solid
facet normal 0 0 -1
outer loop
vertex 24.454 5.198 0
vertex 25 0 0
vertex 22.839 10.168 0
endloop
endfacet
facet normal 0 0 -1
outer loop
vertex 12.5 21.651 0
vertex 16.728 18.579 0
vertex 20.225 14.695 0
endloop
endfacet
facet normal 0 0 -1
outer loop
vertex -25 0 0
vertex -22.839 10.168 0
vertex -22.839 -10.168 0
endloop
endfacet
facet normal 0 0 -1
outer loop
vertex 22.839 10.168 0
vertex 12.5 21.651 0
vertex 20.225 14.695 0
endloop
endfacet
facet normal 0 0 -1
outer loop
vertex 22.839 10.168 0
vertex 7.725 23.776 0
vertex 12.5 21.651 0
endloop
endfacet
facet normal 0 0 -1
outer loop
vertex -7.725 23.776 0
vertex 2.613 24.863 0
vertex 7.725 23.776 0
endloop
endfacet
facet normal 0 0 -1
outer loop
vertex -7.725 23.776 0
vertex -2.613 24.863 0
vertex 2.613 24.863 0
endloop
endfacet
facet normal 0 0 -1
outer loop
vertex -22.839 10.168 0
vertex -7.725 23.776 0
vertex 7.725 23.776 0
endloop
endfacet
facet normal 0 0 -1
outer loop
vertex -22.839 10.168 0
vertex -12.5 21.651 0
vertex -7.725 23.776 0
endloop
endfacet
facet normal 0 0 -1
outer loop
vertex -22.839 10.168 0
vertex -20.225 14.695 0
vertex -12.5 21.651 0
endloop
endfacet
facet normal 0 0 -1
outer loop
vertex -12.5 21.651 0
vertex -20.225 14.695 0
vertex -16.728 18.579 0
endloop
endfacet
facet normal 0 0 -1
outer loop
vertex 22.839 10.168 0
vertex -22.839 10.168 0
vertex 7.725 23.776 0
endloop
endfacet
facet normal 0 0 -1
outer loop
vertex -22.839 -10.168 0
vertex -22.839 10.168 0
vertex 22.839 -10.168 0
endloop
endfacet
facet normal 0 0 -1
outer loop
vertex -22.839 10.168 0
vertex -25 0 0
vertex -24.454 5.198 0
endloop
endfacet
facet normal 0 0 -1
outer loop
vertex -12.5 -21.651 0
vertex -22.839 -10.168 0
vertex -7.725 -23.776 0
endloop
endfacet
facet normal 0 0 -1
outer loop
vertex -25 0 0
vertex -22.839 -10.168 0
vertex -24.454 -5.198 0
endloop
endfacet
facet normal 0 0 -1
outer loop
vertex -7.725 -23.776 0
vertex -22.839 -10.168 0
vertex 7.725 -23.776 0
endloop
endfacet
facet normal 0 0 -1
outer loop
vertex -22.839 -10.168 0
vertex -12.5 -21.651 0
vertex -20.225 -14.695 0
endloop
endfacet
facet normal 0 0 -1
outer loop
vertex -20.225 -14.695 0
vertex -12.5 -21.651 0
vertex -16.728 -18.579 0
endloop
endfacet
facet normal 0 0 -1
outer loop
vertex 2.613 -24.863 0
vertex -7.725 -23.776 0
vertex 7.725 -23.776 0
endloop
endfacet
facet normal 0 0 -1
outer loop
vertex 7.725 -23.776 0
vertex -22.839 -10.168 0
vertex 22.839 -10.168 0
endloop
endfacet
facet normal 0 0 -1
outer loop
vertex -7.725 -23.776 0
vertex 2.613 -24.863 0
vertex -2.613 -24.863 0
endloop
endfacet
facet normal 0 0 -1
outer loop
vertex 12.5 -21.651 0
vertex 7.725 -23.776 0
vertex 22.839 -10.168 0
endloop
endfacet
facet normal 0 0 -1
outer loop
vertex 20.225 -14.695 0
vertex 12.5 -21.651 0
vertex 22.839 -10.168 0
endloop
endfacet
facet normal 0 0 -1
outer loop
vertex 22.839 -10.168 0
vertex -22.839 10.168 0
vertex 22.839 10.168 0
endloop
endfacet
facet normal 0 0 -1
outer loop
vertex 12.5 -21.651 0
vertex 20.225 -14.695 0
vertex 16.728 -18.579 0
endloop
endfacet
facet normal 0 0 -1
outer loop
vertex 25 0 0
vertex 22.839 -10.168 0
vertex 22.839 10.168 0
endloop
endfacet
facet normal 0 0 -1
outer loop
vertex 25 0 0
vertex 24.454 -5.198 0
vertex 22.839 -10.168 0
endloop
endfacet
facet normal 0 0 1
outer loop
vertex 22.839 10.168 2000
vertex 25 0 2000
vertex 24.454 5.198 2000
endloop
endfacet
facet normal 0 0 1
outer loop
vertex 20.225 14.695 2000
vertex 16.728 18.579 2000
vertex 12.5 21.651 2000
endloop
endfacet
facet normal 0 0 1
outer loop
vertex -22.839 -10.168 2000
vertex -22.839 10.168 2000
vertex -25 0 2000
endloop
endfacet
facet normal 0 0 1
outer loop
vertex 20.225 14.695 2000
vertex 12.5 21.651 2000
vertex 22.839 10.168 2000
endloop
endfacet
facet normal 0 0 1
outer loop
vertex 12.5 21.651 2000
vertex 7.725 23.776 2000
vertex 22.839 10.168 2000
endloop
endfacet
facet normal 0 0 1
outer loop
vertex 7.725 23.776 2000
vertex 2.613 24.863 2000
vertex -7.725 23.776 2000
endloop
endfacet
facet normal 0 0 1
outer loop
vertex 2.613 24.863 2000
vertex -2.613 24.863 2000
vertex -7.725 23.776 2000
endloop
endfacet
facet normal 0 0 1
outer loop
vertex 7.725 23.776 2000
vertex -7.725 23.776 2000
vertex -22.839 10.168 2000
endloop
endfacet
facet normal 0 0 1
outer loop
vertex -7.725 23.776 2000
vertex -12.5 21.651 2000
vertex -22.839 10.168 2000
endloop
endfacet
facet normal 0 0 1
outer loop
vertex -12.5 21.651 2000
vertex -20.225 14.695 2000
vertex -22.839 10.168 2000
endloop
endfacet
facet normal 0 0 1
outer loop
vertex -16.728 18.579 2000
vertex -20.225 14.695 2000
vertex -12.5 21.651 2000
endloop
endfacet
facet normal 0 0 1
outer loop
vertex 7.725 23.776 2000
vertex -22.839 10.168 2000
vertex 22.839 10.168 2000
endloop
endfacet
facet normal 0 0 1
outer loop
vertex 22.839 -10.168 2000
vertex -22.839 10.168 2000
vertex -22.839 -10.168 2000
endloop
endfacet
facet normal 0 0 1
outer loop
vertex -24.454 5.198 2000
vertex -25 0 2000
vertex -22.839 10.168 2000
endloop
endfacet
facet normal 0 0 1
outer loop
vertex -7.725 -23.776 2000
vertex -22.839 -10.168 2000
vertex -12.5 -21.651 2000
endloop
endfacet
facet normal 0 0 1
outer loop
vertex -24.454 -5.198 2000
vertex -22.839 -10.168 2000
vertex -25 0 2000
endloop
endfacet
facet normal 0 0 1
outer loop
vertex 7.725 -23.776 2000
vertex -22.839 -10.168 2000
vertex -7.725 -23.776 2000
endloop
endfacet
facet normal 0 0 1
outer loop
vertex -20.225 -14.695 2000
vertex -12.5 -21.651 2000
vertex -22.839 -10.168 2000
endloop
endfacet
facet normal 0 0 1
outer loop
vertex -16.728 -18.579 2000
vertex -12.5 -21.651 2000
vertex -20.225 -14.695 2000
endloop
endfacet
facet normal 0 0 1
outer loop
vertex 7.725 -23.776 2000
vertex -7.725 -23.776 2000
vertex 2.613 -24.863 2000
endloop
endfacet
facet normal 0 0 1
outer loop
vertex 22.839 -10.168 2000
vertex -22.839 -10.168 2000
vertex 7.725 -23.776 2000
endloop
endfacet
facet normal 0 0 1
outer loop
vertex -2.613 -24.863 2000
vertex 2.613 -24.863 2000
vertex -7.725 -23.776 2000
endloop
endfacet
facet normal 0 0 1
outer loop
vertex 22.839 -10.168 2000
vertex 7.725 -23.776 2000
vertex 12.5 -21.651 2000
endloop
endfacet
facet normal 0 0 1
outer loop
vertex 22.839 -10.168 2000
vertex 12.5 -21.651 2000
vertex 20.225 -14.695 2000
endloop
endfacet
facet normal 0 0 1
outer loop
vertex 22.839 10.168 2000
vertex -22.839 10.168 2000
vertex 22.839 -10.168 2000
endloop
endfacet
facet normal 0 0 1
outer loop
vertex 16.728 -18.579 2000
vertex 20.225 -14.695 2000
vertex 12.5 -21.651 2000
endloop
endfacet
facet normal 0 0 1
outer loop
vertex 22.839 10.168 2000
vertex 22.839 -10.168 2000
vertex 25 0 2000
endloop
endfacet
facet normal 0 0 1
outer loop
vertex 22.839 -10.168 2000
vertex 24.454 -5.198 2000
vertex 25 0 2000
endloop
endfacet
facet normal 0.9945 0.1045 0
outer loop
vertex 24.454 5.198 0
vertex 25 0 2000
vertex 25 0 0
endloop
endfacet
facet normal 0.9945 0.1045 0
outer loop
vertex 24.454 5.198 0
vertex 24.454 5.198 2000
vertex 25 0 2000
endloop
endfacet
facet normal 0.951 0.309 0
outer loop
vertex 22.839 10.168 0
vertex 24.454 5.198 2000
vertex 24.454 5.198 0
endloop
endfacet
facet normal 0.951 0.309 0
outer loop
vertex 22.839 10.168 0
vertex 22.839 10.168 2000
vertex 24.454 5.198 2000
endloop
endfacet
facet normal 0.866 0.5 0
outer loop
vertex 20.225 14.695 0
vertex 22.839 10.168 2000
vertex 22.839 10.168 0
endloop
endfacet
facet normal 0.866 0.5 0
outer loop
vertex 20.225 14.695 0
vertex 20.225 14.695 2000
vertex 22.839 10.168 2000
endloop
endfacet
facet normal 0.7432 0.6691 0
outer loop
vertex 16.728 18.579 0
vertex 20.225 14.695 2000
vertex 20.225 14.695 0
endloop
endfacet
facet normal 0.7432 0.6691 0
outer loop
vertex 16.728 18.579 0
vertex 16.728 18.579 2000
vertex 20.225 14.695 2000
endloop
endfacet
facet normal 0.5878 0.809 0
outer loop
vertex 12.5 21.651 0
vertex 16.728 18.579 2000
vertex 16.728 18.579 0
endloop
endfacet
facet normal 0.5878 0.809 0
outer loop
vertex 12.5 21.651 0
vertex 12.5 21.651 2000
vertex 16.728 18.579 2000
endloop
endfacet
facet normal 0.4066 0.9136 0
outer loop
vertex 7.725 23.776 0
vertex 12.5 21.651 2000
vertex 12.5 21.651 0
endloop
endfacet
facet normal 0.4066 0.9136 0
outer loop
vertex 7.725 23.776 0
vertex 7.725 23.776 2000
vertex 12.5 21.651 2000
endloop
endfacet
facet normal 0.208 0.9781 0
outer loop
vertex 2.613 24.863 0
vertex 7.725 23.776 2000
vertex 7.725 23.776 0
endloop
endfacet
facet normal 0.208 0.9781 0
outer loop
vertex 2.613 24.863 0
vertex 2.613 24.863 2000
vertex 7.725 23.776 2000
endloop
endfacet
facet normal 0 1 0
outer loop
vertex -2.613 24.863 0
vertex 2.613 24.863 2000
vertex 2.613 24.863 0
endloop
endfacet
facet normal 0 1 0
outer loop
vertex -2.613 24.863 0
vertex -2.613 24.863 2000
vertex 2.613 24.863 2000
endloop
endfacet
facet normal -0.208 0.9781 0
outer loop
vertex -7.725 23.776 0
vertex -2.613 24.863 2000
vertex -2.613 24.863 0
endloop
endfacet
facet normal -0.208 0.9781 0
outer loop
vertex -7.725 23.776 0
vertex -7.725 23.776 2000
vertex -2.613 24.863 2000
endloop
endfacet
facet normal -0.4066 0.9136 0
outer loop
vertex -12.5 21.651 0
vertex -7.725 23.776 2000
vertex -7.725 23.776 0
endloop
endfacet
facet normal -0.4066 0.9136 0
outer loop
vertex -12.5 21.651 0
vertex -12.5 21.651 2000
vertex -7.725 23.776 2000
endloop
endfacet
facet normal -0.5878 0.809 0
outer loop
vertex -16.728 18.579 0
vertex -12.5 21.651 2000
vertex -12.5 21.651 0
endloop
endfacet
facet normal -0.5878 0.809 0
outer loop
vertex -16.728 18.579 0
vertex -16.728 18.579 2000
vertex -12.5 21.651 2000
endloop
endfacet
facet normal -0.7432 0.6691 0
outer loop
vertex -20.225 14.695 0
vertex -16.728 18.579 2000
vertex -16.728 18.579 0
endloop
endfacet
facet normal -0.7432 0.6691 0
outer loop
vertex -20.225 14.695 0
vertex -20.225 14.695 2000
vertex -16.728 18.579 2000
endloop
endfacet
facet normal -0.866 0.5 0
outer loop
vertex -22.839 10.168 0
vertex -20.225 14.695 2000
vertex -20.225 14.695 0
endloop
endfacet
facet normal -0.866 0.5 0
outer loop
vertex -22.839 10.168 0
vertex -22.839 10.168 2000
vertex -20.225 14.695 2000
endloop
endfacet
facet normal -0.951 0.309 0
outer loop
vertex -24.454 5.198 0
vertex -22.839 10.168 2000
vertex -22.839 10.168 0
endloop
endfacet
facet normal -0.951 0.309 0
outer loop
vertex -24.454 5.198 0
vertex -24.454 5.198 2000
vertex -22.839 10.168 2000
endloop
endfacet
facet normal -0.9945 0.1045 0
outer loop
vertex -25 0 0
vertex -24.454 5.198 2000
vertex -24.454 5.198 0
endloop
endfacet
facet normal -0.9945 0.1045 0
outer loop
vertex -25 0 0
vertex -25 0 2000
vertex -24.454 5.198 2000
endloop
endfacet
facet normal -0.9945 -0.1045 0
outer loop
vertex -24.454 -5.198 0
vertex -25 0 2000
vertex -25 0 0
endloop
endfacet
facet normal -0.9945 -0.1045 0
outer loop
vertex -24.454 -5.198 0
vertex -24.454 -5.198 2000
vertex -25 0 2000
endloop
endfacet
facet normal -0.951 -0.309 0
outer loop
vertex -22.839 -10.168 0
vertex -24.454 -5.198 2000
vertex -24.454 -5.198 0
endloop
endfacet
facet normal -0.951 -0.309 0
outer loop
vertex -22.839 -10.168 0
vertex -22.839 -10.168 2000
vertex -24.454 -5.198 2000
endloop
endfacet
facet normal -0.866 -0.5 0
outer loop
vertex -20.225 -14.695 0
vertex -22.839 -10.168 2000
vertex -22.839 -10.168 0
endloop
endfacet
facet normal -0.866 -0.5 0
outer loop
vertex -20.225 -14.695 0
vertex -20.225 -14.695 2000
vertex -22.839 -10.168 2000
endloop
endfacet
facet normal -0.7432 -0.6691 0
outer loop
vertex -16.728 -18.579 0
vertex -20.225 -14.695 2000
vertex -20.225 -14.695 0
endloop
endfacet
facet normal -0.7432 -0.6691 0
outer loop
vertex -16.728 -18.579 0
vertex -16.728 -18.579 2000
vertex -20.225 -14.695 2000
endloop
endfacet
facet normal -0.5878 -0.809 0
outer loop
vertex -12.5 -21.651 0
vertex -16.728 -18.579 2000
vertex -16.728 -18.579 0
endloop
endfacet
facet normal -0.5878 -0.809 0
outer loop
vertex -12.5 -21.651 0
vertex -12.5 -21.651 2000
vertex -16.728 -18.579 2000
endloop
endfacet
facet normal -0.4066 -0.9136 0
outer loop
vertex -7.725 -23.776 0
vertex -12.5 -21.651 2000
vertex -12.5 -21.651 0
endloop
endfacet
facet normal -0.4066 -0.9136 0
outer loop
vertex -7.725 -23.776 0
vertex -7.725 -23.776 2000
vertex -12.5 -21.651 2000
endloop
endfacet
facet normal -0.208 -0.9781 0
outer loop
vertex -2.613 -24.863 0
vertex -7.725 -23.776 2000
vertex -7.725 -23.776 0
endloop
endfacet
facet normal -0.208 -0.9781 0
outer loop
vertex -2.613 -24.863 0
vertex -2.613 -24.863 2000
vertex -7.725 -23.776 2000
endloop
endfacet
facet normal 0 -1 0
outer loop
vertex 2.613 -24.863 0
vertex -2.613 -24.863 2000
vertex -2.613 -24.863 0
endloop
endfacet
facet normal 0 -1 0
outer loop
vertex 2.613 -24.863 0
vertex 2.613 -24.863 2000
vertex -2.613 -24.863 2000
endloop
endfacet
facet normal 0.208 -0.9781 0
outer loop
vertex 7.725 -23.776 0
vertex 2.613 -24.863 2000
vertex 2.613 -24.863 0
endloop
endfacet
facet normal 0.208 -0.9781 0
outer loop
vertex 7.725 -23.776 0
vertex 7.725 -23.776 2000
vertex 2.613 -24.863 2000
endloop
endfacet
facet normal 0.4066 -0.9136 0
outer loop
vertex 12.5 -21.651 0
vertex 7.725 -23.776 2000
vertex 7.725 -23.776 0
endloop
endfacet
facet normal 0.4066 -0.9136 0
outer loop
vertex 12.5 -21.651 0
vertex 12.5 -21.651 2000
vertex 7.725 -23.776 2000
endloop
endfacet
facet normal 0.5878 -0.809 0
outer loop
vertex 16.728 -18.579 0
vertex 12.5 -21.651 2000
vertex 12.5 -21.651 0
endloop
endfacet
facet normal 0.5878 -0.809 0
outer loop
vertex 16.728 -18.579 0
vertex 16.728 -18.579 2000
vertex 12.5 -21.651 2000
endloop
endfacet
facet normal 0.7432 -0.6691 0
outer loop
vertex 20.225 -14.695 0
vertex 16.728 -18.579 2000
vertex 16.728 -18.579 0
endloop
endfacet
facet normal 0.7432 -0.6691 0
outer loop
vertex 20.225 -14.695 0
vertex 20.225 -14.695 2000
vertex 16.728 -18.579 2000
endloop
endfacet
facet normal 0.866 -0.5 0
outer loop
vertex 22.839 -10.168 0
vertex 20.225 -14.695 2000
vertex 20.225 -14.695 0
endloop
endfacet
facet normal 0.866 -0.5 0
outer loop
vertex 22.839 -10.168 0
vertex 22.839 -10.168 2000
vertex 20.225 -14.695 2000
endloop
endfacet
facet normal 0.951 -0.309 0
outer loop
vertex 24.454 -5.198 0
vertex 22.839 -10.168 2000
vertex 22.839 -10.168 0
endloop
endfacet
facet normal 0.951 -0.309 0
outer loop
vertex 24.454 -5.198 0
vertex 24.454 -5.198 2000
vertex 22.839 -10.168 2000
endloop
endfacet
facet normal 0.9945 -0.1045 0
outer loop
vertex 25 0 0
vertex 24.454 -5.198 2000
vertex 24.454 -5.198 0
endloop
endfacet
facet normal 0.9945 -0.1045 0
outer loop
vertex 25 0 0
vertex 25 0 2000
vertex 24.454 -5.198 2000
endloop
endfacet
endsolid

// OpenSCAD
/*
 rod
 diameter = a
*/

module simple_profile_R(a, length) {
    echo(material="<b>rod</b>", a, length);
    radius = a/2;
    linear_extrude( height = length ) {
        circle(r=radius, center=true);
    }
}

simple_profile_R(50, 2000);
